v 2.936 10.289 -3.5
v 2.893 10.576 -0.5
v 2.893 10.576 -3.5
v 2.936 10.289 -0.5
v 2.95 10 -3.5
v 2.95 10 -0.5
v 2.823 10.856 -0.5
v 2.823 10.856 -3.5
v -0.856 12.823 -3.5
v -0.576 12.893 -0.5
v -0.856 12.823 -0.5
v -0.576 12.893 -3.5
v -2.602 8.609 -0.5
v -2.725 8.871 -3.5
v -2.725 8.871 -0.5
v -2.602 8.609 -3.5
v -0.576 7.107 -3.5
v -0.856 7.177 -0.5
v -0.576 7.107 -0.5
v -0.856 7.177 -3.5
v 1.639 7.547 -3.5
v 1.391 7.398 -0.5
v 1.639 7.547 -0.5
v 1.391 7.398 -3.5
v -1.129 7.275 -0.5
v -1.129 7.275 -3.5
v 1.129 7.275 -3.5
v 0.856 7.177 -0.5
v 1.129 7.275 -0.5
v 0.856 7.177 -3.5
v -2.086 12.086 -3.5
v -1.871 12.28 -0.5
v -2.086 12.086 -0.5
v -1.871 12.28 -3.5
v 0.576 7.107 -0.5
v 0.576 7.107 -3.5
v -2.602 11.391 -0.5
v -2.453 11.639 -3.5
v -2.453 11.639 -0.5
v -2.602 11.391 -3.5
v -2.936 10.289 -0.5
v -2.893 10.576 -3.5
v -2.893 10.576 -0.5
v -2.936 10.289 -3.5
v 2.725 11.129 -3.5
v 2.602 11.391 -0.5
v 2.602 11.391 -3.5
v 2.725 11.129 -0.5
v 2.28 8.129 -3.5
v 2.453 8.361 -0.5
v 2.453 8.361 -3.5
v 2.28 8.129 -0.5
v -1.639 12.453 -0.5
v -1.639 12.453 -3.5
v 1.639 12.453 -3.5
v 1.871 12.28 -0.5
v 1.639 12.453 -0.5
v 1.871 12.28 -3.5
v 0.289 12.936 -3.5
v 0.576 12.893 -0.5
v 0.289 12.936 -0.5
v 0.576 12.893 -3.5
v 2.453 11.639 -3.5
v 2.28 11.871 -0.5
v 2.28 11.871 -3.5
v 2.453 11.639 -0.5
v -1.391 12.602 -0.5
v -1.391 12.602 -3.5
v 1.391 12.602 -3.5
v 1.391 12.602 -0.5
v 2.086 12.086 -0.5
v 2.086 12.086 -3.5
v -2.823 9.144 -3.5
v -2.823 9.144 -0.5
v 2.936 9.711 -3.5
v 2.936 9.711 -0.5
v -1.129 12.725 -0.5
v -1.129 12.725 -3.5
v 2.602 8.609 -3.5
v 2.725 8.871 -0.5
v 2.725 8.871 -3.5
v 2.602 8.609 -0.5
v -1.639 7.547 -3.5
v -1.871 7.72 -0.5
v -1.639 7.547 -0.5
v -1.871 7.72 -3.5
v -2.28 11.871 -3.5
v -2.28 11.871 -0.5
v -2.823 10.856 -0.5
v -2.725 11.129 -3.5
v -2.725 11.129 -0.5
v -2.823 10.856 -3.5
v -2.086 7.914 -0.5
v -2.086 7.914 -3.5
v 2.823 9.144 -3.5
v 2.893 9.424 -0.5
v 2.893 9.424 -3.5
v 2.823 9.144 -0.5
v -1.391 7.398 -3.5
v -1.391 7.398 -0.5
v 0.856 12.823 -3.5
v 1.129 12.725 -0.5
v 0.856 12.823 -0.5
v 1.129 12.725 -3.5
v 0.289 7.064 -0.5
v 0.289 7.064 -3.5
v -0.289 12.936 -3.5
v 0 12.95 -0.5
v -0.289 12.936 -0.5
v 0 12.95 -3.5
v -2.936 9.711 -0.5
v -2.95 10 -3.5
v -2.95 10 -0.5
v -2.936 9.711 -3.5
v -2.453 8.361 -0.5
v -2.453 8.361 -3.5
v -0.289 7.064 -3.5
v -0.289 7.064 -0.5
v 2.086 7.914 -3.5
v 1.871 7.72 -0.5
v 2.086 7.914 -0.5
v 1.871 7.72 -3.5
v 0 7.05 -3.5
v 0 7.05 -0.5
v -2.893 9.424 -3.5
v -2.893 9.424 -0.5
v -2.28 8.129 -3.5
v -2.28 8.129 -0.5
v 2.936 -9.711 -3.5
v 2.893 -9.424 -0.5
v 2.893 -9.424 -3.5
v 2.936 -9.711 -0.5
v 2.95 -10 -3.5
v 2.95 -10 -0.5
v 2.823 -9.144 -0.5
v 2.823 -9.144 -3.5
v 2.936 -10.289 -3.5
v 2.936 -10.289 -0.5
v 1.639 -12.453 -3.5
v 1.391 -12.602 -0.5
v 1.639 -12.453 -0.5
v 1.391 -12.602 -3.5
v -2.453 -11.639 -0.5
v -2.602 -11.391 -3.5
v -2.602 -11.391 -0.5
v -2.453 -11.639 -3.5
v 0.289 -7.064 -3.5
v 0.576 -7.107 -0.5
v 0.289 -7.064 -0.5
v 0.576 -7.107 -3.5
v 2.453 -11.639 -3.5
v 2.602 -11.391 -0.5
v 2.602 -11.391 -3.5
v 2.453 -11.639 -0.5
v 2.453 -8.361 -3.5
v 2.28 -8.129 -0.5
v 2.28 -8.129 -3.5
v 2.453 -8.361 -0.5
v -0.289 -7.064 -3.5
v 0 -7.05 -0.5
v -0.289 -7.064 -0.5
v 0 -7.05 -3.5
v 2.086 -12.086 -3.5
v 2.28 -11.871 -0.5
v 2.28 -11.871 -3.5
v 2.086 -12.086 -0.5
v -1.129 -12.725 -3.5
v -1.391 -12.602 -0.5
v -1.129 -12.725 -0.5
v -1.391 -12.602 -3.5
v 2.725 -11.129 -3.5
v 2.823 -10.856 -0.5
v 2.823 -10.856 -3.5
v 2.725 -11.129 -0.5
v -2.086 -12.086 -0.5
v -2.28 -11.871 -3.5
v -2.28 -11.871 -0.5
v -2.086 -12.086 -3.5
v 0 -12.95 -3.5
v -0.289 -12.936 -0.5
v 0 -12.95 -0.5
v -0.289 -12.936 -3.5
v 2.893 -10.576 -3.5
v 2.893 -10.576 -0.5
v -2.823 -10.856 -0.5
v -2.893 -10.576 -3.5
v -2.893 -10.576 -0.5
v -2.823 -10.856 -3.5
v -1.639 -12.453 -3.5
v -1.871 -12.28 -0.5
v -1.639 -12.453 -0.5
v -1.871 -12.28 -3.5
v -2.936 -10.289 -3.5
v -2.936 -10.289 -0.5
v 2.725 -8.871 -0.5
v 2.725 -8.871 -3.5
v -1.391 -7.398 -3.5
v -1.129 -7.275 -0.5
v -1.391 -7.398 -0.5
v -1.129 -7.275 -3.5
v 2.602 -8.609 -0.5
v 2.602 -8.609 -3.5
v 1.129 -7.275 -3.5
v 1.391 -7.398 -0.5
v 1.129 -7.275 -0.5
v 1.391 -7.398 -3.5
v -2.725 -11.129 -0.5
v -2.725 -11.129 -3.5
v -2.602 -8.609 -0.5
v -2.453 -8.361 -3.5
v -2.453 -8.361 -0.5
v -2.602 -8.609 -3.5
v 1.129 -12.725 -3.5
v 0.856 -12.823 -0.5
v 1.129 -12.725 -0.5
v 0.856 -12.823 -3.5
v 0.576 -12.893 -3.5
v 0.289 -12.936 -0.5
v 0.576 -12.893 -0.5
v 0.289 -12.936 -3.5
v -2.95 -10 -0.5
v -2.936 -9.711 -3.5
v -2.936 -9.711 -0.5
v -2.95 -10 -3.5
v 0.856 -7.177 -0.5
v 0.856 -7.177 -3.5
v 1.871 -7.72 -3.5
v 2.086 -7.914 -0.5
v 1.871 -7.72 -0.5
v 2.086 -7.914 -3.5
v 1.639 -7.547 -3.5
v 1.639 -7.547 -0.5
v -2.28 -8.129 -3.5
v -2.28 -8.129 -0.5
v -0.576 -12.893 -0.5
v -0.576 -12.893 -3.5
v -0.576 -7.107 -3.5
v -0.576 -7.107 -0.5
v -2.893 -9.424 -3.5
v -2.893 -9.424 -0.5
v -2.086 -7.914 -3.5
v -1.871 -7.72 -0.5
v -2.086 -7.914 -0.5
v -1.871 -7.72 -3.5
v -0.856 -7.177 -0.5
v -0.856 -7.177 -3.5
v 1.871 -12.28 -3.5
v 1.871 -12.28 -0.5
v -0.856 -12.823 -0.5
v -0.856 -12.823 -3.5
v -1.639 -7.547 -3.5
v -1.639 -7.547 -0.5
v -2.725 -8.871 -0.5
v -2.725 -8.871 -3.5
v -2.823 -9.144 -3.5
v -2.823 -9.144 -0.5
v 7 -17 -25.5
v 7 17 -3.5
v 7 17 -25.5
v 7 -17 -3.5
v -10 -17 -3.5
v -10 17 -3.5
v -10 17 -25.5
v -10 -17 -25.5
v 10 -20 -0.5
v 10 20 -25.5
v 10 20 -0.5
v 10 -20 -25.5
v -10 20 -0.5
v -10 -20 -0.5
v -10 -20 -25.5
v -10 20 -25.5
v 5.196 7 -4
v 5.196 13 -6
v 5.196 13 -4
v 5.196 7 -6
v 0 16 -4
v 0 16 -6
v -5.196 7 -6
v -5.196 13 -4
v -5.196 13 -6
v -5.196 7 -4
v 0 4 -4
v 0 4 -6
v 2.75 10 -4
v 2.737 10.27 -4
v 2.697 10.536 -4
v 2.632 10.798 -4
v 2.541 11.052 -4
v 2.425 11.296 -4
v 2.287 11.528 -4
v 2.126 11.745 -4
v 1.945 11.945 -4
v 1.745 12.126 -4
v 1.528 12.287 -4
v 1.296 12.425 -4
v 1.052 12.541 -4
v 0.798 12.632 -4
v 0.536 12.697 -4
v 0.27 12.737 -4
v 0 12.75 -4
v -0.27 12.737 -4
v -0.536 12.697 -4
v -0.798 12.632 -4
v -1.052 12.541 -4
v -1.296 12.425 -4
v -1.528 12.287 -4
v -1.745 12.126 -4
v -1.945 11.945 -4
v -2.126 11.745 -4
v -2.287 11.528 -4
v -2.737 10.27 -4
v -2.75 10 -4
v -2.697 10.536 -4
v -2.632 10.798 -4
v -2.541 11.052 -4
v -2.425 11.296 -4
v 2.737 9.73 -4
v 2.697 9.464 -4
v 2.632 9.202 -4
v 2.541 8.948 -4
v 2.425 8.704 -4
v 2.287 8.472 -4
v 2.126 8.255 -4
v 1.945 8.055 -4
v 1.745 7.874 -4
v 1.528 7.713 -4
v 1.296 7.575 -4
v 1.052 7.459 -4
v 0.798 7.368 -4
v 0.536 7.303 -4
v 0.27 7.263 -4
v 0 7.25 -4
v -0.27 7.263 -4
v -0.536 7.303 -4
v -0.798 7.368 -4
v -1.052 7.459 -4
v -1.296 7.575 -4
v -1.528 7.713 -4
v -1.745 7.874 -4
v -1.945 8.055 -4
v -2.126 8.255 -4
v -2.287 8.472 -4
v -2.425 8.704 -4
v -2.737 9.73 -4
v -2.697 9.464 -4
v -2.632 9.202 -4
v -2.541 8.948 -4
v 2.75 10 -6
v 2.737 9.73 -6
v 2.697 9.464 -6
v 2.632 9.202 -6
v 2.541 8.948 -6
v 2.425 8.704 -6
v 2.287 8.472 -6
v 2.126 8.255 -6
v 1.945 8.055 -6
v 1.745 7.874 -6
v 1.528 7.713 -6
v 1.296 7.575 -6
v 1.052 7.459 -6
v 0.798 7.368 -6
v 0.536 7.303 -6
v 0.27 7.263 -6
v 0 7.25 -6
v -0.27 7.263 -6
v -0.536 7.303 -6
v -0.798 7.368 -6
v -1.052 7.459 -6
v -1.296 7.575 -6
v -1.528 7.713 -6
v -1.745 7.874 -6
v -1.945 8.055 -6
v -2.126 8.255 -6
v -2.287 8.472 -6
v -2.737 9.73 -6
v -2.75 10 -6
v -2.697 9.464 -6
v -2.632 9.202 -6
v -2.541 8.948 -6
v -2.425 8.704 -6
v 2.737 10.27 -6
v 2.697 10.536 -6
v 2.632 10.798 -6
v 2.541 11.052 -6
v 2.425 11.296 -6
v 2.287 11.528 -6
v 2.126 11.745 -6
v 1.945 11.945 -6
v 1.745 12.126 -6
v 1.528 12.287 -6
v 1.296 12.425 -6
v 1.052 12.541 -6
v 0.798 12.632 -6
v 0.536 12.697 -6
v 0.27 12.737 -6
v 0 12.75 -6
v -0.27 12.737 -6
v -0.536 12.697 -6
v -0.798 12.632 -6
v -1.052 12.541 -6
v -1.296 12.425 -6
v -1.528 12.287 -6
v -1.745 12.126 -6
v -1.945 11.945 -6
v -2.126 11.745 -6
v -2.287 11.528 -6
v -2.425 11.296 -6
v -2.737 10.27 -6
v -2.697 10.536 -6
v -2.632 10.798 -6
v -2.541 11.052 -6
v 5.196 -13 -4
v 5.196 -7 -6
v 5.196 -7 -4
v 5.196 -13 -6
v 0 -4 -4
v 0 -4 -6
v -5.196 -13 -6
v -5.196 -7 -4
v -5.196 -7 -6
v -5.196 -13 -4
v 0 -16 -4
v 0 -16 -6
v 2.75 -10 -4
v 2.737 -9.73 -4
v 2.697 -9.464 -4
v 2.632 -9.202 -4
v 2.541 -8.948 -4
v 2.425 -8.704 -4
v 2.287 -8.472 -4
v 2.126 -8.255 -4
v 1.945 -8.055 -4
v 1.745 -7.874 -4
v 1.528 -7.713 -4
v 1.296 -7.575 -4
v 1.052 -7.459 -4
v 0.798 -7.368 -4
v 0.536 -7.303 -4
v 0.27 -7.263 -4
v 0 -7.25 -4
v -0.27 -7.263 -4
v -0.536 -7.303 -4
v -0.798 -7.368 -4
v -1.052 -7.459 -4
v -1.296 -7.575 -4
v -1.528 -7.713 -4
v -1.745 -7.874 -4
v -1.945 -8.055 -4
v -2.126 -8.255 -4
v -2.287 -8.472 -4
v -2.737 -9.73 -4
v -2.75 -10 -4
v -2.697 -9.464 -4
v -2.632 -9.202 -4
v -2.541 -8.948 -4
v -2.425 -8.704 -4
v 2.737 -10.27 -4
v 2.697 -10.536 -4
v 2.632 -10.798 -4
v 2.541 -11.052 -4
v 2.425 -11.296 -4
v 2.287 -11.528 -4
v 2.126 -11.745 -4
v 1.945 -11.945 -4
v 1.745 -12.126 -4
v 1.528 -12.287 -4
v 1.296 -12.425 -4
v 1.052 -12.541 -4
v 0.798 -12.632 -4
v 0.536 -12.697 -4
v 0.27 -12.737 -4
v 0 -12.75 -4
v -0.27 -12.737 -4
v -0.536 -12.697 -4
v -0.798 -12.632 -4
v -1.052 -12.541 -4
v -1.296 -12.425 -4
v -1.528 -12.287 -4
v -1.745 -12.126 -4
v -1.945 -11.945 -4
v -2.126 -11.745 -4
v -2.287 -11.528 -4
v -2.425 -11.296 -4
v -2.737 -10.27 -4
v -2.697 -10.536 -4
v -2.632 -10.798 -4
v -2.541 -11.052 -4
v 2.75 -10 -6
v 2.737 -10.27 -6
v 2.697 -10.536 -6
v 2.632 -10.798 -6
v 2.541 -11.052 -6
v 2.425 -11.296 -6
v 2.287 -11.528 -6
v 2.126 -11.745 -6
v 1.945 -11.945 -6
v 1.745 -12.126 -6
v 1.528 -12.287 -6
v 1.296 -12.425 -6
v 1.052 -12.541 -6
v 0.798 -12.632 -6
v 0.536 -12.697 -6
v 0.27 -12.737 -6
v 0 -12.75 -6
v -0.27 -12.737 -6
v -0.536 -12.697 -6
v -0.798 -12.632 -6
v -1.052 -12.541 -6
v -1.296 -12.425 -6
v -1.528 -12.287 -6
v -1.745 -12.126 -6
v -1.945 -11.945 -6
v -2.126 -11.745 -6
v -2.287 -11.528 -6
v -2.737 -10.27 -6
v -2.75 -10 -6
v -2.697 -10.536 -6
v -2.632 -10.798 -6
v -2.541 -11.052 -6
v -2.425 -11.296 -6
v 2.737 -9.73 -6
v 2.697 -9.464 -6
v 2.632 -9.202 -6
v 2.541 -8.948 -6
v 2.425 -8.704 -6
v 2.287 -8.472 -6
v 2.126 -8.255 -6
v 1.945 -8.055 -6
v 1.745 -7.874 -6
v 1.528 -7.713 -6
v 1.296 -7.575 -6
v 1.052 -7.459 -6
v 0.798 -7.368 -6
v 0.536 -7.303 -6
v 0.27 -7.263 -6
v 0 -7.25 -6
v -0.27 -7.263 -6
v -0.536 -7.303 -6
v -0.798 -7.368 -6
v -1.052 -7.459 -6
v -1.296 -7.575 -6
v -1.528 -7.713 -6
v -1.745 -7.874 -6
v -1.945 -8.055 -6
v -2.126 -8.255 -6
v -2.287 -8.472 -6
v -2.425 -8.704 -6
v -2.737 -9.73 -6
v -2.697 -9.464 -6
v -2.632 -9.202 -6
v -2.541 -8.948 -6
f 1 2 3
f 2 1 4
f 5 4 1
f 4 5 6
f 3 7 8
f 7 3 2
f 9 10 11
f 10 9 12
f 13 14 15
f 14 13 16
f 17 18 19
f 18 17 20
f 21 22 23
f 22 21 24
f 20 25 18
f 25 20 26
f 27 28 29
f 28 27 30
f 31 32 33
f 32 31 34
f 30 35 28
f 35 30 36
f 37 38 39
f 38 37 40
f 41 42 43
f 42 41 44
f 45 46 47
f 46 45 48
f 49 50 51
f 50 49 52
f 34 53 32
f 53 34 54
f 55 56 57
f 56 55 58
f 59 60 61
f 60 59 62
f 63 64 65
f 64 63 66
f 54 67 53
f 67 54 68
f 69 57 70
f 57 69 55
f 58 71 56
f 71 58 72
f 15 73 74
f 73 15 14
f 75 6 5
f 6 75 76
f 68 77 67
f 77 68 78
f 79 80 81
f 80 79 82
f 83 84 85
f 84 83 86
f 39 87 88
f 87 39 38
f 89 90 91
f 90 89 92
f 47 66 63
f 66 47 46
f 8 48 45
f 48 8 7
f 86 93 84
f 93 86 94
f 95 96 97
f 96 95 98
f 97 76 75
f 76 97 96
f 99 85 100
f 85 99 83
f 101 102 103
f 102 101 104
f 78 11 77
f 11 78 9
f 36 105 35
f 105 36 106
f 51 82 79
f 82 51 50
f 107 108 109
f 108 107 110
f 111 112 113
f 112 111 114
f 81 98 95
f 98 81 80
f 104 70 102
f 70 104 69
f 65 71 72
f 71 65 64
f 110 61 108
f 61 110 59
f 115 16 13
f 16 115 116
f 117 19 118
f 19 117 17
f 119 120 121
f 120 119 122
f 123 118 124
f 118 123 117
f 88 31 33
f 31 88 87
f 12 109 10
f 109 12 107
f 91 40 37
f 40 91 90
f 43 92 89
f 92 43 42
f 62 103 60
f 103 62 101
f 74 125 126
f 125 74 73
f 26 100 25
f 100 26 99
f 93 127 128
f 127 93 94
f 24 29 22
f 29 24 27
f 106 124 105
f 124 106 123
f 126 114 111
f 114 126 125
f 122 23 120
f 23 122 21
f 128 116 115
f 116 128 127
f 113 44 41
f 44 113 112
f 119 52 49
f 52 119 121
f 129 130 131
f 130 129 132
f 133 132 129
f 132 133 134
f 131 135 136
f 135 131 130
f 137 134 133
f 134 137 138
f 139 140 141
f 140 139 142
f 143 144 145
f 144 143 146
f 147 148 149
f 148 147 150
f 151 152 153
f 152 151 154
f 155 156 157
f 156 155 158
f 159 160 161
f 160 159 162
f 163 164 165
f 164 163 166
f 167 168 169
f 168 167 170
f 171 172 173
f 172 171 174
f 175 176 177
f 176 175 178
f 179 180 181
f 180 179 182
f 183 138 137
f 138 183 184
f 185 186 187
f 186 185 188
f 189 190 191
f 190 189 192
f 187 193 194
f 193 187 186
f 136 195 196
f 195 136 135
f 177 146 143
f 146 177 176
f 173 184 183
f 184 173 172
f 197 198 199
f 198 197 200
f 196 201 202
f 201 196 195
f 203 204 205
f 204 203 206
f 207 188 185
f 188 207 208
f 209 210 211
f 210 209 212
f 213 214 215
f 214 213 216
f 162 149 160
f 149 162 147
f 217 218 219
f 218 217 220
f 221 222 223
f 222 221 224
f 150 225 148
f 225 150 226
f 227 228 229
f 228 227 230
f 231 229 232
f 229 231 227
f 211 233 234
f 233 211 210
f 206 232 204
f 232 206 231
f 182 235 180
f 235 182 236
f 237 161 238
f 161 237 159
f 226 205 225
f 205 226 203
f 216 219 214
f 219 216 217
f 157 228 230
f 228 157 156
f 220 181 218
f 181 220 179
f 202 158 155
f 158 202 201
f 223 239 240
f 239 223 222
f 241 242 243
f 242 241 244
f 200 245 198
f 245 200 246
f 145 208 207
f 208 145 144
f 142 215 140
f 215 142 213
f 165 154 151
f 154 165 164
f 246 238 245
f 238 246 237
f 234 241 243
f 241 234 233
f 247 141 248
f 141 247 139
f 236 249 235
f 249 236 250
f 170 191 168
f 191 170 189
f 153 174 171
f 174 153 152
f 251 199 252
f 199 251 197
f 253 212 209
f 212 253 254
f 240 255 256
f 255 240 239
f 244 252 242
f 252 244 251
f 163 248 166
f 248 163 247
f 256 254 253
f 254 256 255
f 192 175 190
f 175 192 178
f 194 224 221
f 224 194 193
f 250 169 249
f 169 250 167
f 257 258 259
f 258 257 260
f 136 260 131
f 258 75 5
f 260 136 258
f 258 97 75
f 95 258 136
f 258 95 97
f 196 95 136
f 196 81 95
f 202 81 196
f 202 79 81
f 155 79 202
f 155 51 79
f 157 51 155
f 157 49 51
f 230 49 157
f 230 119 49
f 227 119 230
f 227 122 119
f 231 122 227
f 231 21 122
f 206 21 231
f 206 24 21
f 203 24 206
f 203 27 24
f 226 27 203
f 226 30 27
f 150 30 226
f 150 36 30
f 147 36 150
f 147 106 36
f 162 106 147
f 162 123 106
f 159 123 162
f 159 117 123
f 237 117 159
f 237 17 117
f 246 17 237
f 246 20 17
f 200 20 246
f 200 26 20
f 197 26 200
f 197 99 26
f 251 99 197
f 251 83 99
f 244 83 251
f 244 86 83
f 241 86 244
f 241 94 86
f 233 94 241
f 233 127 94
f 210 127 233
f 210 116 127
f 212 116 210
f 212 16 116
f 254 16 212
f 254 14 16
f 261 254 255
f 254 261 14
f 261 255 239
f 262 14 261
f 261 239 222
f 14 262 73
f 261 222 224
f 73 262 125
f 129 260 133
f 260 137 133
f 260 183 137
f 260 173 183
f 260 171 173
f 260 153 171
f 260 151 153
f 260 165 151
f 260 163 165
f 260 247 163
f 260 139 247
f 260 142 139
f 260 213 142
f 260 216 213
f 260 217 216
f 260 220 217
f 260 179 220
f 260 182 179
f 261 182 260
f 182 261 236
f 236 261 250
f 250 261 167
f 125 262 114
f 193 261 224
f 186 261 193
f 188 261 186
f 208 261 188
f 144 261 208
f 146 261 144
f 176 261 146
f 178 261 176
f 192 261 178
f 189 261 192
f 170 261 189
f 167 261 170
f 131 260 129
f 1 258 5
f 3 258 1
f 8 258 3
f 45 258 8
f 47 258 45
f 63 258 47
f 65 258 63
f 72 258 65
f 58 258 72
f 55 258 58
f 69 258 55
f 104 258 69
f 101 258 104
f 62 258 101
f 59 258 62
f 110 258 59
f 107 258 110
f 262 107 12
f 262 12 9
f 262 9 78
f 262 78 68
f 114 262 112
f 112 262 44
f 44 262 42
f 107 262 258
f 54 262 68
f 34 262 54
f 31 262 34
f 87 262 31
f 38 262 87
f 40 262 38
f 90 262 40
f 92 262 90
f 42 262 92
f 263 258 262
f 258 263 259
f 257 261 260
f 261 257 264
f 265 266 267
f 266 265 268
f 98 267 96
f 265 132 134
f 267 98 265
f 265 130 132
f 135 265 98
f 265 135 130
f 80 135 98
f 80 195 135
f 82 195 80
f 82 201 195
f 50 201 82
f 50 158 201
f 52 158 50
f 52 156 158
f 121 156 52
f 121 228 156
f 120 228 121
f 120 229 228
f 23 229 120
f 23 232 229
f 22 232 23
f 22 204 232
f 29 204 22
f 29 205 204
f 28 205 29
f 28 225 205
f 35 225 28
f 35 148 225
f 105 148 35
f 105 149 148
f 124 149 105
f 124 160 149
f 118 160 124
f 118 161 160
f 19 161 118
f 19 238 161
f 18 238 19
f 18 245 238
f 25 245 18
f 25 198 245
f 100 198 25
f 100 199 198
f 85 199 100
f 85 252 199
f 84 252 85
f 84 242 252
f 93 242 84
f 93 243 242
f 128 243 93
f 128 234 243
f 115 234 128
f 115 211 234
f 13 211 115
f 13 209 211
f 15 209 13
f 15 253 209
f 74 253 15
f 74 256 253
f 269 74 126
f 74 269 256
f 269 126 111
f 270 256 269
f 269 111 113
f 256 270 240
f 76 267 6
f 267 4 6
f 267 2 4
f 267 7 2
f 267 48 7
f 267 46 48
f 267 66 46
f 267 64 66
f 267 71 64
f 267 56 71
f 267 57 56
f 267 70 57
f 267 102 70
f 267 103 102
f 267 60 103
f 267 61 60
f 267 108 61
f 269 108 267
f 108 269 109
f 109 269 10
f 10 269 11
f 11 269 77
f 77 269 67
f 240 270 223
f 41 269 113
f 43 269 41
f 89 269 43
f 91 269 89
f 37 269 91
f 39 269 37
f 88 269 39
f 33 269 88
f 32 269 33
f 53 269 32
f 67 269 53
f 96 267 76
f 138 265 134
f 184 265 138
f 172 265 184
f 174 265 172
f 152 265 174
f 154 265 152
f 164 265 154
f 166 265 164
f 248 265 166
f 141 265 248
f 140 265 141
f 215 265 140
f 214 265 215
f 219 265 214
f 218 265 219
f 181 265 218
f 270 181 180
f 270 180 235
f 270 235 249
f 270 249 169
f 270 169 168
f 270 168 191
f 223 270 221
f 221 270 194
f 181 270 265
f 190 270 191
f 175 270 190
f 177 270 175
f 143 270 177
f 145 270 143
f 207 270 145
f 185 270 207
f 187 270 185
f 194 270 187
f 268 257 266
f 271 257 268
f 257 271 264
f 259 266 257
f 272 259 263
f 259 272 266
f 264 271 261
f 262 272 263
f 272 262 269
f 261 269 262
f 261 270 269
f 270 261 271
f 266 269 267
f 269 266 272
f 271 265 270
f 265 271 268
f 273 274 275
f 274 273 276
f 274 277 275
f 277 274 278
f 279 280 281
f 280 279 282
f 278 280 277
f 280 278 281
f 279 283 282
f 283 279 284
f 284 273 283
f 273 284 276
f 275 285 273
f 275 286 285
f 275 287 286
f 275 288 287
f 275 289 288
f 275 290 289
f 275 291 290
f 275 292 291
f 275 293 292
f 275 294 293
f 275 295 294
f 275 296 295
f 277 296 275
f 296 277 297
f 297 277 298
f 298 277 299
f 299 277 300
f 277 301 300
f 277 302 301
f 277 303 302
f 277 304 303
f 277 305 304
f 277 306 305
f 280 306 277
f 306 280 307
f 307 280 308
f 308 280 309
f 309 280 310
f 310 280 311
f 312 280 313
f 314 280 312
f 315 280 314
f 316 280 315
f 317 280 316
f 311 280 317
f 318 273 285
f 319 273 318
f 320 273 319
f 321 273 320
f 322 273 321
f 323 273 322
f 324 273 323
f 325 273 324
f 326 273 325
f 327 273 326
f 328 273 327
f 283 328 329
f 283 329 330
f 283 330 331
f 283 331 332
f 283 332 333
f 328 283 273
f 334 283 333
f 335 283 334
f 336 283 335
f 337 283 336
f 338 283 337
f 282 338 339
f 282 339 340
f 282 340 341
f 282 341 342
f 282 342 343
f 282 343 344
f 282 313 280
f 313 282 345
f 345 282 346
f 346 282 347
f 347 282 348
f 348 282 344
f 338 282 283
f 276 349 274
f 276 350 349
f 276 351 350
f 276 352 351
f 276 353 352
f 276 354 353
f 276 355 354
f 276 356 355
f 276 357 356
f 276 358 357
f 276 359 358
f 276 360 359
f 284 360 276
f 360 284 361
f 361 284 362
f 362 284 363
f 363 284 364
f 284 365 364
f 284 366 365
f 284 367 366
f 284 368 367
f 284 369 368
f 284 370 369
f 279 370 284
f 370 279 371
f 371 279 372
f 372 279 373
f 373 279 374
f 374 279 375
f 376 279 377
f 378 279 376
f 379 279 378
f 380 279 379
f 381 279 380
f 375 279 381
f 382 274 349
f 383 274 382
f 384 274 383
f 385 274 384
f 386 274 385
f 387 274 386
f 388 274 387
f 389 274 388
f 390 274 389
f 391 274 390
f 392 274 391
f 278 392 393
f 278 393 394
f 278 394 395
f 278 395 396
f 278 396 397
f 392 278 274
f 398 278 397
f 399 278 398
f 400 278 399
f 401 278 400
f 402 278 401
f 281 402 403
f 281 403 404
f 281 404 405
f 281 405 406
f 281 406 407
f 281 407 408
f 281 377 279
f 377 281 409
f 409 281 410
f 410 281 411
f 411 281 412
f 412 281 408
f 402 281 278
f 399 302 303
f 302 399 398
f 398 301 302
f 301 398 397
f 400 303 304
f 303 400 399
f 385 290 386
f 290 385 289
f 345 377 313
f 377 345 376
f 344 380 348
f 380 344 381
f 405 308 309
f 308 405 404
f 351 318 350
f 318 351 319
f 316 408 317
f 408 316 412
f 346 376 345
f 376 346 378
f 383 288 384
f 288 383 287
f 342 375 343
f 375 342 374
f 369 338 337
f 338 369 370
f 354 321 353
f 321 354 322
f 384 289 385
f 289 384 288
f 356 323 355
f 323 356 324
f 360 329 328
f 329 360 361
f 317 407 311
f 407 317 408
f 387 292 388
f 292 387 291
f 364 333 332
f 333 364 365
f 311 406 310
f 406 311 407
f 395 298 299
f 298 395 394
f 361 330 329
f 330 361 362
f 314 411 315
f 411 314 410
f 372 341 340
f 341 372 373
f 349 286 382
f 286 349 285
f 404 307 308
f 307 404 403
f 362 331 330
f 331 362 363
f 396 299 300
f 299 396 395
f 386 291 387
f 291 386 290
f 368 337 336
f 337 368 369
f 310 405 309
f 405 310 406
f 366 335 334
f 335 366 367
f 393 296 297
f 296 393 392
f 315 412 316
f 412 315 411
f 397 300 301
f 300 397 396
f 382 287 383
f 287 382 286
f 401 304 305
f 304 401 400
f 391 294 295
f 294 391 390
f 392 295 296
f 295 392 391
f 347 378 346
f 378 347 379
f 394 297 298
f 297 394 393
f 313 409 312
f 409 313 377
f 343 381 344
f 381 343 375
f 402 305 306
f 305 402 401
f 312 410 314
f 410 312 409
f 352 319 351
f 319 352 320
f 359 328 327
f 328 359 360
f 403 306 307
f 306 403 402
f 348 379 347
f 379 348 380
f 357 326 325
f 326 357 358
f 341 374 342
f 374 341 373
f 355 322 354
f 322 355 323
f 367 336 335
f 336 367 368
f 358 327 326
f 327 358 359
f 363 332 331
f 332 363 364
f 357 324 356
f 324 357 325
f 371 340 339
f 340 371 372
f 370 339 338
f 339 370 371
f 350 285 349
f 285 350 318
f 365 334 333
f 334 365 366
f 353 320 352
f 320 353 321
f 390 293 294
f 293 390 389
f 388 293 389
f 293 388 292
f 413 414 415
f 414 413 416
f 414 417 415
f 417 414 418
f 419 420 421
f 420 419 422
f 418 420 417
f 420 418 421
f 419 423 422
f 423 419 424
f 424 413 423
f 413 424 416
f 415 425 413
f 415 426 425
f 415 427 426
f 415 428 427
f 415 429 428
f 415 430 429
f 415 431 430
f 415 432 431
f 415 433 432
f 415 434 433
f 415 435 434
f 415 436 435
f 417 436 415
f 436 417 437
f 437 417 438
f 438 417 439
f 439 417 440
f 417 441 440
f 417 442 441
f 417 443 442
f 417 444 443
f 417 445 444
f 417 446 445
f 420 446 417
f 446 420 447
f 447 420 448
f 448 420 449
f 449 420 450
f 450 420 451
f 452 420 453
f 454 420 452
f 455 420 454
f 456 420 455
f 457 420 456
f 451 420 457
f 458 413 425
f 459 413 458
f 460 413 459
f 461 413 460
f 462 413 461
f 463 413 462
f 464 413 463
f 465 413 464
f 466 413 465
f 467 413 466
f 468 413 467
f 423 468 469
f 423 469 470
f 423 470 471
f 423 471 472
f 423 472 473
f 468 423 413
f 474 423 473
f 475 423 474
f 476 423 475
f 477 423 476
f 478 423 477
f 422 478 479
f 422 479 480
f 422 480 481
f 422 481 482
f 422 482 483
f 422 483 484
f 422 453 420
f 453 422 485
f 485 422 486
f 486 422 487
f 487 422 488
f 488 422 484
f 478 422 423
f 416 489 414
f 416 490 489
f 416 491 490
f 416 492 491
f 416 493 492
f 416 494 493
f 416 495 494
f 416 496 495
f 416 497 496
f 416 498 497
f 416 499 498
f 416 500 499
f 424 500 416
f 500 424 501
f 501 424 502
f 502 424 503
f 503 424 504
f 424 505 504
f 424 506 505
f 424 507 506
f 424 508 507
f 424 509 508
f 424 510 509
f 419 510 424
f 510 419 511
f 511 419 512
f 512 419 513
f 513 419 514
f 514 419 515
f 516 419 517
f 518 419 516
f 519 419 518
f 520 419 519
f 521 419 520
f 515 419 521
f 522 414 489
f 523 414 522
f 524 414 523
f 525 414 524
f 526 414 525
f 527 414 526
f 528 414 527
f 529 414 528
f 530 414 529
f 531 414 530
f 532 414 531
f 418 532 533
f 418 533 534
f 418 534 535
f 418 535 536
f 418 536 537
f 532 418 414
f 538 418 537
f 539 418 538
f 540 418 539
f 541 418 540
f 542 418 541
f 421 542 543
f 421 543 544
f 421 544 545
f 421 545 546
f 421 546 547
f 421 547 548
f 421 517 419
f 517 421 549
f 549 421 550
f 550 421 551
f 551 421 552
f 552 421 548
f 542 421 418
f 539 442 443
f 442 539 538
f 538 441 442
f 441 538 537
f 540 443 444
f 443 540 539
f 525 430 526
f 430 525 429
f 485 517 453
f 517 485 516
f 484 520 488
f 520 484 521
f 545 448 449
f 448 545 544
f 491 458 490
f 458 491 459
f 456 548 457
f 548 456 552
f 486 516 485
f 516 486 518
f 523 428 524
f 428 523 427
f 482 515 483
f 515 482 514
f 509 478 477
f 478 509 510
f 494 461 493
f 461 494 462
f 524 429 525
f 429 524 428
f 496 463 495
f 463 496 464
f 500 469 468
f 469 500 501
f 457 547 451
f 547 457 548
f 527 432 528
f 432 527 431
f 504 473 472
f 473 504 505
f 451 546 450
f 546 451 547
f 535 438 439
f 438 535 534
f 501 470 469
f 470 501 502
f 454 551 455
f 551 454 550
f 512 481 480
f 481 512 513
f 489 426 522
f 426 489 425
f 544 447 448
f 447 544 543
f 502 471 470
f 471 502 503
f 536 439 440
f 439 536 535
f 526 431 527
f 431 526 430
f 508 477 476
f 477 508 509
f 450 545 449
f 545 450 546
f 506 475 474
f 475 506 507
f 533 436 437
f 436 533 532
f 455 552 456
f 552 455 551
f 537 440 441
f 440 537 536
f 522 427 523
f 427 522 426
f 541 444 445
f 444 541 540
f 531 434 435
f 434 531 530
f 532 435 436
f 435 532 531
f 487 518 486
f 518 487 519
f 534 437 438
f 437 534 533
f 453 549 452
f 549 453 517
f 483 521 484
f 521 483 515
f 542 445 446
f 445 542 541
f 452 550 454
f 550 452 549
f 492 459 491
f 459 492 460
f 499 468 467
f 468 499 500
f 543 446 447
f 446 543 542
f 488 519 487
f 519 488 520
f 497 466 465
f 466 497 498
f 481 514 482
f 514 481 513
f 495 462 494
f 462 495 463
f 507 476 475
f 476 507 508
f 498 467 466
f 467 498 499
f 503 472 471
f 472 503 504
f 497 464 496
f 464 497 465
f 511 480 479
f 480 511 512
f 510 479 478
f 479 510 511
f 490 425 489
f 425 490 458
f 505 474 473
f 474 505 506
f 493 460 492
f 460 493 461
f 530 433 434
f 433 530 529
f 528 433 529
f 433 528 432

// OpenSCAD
// file: nut_banana.scad
//nut();

module nut() {
    color("pink")
    difference() {
        cylinder(d=12, h=2, center=true, $fn=6);
        cylinder(d=5.5, h=3, center=true, $fn=64);
    }
}
// main file
include<nut_banana.scad>


$fn = 64;
diam_hole = 5.4 + 0.5;

translate([0, 0, -25/2-0.5])
banana();
translate([0, 20/2, -5])
rotate([0, 0, 90])
nut();

translate([0, -20/2, -5])
rotate([0, 0, 90])
nut();
//color ("red")
//translate([-3, 0, 0])
//cube([20, 40-6, 25-6], center = true);



module banana() {
    difference() {
        base();
        holes();
    }
}

module base() {
    cube([20, 40, 25], center = true);
}


module holes() {
    translate([0, 20/2, 0])
    cylinder(d=diam_hole, h = 50, center = true);

    translate([0, -20/2, 0])
    cylinder(d=diam_hole, h = 50, center = true);
    
    translate([-3, 0, -3])
    cube([20, 40-6, 25], center = true);
}
